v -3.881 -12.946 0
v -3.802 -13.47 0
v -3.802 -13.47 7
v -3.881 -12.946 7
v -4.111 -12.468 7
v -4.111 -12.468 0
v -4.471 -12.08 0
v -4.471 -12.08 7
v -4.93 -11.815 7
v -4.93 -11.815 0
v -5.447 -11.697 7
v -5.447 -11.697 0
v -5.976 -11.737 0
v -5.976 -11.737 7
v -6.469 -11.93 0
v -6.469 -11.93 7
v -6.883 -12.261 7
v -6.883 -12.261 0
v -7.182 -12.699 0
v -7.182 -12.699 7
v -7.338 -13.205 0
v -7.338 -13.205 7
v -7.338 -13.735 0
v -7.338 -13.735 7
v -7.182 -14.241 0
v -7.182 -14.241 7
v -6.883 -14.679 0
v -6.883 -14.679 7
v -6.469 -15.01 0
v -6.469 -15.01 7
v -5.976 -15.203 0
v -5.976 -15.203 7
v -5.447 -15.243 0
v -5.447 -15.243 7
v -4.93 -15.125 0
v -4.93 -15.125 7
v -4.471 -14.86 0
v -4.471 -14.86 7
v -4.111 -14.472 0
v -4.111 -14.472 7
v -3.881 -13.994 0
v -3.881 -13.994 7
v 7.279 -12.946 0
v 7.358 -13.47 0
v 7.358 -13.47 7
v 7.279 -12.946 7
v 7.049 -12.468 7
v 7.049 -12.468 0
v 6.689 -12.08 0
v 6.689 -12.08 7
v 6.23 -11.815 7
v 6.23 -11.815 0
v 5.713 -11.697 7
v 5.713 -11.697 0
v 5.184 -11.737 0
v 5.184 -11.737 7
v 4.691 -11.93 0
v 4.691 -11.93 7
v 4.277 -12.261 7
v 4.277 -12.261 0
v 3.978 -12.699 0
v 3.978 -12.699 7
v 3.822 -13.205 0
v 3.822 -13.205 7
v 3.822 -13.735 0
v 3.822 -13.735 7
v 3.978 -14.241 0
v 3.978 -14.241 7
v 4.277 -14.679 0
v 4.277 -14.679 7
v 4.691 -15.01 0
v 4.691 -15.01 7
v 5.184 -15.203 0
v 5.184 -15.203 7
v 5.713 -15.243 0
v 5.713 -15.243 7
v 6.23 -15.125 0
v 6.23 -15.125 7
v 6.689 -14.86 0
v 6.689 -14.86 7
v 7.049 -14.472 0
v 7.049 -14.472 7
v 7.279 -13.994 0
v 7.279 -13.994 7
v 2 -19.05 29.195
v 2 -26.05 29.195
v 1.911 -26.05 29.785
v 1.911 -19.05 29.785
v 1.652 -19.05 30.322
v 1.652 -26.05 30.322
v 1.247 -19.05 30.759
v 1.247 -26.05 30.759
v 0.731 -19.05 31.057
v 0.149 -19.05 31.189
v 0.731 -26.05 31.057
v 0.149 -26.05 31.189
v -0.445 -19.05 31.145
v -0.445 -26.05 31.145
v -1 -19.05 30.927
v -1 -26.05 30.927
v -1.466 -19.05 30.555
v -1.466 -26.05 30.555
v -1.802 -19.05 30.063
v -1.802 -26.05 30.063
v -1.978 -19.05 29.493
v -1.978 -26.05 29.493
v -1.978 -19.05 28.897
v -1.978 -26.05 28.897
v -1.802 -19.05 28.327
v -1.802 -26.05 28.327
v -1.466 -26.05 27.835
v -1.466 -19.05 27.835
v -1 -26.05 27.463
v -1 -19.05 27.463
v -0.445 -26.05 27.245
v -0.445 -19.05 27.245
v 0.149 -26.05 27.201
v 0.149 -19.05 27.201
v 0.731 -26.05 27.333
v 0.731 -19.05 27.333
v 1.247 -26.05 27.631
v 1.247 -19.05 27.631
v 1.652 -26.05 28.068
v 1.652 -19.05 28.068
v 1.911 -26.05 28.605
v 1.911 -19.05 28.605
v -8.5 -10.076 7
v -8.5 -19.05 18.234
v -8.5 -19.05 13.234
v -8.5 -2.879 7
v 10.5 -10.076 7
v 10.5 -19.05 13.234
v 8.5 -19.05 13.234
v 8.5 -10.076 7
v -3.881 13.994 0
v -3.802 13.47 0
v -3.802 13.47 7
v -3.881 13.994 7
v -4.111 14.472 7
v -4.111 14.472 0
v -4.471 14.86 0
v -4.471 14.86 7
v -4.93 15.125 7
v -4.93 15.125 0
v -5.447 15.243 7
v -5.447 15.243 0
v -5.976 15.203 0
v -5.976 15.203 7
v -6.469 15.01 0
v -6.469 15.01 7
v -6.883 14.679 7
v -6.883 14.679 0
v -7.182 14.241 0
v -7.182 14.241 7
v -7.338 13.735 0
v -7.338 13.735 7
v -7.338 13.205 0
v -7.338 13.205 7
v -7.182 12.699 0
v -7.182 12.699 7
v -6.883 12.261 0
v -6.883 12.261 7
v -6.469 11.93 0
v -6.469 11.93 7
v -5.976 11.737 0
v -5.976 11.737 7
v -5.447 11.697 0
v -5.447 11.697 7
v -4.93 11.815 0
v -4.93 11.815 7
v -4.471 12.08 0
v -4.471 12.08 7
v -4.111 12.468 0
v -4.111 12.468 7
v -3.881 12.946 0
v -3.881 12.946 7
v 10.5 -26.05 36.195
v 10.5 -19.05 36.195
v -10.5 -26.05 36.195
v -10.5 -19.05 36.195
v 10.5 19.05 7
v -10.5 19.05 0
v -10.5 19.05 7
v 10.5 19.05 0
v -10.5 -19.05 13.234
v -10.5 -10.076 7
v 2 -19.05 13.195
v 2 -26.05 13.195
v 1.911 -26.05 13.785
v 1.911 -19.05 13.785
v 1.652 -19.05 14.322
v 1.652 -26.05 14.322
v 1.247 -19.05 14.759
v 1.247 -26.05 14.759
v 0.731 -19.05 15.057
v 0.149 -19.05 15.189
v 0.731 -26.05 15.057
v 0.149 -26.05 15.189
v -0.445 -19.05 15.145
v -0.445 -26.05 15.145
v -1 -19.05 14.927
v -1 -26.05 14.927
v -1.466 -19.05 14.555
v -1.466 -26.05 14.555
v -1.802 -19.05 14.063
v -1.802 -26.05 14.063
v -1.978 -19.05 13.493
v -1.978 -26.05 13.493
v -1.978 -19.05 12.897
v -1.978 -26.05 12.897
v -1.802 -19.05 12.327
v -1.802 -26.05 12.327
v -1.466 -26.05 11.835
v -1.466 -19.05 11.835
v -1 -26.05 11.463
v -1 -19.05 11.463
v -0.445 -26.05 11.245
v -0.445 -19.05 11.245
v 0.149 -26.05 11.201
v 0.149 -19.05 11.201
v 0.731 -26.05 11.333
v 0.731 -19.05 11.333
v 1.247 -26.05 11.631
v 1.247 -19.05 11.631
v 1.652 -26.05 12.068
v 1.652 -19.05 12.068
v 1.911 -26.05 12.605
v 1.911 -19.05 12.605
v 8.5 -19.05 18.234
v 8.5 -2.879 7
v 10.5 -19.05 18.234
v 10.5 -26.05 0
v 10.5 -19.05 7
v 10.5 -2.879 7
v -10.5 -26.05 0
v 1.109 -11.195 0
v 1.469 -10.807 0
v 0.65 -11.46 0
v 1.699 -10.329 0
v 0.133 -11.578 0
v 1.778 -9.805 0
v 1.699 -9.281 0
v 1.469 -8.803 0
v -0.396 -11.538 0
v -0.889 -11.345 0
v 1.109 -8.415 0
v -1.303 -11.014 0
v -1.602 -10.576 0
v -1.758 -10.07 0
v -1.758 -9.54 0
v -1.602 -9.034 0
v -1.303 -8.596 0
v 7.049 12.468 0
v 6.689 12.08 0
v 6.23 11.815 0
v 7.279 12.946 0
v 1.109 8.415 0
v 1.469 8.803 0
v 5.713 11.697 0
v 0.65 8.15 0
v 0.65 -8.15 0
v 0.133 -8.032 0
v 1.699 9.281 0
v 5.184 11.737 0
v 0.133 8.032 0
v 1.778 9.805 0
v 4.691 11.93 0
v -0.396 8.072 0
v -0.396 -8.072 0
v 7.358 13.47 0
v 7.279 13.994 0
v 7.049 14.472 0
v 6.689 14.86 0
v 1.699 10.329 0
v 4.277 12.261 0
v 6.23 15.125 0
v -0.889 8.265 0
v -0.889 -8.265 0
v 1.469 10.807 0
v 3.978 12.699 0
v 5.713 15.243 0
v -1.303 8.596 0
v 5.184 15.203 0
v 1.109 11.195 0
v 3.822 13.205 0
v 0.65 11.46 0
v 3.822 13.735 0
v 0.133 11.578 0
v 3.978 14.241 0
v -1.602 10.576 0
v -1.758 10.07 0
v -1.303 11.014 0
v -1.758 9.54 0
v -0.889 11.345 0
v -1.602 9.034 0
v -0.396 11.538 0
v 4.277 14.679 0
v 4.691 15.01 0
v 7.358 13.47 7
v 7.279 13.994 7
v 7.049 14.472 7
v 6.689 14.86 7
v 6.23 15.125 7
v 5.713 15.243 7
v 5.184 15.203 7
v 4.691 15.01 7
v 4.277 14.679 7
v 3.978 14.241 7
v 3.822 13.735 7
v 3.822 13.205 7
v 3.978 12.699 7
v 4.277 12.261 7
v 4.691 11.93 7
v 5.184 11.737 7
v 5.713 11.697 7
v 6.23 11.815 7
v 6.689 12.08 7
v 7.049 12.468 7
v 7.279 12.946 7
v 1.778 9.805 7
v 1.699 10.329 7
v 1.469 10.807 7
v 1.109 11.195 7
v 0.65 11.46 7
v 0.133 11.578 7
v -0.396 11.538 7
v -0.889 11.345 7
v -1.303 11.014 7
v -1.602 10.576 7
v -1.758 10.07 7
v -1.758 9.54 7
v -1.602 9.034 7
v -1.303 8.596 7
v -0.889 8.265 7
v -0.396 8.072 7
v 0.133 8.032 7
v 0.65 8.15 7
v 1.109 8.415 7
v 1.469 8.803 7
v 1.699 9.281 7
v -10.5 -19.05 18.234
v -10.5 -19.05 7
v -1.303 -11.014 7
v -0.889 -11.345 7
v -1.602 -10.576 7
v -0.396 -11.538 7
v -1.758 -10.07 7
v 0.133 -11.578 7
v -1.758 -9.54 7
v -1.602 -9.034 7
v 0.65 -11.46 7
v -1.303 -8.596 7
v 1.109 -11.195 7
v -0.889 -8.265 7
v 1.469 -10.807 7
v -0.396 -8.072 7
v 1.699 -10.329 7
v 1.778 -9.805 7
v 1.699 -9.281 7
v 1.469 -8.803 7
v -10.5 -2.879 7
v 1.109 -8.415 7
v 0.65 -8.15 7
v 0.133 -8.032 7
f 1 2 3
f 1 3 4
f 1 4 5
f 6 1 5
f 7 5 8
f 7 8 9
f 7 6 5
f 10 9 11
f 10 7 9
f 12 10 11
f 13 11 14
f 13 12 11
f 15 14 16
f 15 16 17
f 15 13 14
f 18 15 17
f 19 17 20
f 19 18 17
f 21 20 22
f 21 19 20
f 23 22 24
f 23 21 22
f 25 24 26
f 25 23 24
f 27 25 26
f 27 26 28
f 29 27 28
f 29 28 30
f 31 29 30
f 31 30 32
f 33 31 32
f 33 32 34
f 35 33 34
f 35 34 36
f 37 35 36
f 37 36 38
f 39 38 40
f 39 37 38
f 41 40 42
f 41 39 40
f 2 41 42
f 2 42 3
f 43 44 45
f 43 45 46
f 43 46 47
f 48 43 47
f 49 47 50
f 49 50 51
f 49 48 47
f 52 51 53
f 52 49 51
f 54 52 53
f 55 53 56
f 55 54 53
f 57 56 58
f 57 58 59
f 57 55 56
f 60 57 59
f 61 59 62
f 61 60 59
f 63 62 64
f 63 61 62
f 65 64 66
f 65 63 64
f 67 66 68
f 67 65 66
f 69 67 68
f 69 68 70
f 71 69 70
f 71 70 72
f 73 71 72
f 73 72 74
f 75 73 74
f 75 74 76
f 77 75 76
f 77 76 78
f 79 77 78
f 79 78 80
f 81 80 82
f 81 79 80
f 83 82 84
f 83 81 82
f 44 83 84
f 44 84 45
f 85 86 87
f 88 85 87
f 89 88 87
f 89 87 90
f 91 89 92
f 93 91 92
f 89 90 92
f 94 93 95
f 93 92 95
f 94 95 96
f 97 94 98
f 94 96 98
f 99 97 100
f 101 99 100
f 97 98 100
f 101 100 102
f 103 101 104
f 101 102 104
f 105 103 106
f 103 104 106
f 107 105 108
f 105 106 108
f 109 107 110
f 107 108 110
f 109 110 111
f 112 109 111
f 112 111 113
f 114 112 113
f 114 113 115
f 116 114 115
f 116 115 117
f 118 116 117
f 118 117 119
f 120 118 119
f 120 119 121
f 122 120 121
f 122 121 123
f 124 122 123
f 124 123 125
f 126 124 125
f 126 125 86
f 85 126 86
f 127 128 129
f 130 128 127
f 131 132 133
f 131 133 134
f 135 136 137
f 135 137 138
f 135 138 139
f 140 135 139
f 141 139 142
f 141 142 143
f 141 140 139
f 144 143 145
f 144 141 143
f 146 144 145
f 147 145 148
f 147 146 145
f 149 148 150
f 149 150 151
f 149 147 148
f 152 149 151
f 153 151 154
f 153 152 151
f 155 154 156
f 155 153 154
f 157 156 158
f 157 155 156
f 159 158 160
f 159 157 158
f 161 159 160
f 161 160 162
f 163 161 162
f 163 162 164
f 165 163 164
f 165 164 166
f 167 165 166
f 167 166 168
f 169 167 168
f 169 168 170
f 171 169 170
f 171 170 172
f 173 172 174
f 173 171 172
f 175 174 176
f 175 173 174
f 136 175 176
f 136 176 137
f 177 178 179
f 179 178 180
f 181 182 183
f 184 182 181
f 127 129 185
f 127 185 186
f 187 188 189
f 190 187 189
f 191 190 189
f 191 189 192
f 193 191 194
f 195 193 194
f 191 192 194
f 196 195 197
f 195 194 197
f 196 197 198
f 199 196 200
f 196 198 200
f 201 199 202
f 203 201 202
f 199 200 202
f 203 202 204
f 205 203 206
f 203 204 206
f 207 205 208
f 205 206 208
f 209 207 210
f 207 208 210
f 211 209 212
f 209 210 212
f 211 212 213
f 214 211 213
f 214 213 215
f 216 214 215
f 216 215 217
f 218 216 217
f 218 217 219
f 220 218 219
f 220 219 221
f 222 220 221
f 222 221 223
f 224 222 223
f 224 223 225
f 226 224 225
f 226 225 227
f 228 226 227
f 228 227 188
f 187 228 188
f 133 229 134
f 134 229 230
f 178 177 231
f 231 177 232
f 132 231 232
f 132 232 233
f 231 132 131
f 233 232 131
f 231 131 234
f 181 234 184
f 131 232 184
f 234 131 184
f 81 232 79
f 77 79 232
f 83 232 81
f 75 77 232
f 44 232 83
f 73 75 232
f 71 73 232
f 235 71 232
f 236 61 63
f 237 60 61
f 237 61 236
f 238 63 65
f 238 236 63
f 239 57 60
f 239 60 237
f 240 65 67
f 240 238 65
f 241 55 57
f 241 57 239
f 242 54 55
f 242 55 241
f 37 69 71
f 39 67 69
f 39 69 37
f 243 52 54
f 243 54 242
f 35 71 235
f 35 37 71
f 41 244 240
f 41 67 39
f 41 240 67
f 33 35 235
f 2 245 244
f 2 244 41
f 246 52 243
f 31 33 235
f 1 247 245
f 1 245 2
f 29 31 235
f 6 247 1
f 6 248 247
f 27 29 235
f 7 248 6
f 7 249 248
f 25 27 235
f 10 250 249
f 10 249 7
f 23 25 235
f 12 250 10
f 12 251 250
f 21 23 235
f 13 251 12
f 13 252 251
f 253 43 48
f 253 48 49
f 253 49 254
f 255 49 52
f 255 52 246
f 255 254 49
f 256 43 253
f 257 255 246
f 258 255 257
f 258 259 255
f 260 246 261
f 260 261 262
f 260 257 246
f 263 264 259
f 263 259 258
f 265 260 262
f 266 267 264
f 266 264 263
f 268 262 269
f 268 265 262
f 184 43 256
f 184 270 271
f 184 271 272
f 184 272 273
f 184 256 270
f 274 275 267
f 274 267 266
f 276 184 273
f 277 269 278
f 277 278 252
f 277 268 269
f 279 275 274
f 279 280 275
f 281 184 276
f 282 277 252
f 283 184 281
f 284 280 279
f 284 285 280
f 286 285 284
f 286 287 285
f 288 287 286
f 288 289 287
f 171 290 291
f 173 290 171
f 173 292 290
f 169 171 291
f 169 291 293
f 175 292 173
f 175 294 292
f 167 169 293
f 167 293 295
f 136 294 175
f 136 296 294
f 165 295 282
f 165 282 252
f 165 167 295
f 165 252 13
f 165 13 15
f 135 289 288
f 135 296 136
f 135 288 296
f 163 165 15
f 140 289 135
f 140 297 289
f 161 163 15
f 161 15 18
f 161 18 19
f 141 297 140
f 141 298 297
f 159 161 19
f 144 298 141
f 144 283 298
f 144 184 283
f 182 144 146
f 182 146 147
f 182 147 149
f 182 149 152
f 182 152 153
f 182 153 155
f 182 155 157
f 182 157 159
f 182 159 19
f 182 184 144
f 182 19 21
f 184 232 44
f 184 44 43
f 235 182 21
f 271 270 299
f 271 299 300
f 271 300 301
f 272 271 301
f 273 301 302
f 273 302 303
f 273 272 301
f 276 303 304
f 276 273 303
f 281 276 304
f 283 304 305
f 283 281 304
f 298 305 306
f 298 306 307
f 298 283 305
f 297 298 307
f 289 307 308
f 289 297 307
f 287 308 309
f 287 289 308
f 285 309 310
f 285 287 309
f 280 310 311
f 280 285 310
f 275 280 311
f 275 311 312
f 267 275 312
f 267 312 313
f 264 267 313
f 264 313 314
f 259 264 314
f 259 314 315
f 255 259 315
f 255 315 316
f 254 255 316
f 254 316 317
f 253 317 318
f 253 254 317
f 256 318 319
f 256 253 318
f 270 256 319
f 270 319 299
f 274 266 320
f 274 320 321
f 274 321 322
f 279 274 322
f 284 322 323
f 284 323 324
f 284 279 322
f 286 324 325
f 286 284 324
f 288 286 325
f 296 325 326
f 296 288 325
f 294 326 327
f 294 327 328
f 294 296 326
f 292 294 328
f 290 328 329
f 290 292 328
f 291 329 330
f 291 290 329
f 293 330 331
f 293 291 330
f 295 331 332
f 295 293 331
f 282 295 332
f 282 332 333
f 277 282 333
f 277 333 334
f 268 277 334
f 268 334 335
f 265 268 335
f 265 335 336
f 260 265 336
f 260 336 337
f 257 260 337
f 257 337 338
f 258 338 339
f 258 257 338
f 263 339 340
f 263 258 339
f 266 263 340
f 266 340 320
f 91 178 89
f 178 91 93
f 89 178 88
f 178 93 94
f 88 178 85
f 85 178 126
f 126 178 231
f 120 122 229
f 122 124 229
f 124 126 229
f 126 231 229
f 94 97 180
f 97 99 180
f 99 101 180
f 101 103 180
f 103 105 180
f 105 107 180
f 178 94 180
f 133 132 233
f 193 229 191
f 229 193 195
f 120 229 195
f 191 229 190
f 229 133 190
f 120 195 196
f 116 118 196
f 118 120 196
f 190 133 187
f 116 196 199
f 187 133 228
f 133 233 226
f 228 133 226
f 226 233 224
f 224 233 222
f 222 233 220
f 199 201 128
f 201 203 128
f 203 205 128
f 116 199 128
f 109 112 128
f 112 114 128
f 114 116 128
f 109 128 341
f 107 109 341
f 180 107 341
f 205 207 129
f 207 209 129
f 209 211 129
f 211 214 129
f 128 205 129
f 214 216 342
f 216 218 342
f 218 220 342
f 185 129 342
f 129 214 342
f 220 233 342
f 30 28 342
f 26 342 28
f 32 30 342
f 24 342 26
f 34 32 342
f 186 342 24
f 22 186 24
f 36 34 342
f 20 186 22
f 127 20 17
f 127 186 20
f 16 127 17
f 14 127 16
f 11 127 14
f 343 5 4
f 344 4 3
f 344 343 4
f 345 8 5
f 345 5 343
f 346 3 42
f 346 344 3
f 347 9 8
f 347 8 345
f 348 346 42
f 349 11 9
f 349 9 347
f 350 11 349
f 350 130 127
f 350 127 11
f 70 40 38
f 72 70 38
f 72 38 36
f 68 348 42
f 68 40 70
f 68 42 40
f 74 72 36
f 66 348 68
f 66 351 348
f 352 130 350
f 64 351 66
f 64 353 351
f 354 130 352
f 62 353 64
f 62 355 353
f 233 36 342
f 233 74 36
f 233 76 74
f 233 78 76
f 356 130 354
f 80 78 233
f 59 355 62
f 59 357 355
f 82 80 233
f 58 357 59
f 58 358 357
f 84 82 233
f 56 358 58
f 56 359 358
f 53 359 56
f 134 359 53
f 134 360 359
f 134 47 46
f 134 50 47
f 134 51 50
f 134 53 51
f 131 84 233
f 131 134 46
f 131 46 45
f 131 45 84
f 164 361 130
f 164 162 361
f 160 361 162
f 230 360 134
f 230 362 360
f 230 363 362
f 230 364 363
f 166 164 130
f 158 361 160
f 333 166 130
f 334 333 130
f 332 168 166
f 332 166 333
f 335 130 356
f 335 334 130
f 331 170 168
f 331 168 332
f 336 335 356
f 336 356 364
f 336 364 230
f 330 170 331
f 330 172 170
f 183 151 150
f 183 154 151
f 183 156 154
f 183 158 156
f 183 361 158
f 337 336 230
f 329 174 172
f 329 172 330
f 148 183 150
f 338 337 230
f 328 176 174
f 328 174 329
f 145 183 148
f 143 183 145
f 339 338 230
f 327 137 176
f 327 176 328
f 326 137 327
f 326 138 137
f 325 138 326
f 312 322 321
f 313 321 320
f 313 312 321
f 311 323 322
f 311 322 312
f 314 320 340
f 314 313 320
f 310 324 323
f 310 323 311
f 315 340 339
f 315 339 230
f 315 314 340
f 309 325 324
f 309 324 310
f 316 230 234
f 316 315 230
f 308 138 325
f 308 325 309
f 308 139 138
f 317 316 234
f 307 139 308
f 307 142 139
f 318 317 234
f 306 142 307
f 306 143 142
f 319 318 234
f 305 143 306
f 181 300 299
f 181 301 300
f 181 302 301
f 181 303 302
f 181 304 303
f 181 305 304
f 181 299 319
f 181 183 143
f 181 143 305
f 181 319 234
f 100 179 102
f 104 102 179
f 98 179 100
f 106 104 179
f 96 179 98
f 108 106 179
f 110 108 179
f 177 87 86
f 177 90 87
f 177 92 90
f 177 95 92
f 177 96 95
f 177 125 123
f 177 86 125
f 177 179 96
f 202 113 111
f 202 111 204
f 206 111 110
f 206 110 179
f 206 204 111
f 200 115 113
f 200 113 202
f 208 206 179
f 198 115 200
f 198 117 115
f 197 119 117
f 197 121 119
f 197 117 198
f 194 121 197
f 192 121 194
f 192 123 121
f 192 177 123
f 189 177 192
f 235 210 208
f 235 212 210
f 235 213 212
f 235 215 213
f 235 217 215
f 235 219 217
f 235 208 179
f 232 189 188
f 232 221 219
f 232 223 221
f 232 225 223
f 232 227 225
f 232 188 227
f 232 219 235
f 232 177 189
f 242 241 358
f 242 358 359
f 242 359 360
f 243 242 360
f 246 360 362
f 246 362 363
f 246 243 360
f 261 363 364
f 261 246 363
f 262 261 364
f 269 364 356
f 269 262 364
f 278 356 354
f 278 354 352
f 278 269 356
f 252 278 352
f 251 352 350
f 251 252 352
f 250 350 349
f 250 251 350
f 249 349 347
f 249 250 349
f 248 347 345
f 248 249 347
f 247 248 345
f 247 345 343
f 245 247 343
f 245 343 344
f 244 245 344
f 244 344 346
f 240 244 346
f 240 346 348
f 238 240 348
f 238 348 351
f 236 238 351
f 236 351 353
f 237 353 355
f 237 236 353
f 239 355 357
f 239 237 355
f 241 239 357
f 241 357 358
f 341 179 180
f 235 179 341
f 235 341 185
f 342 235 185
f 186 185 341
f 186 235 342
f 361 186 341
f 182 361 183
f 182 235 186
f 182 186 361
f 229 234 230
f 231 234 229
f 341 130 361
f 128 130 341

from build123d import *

# Parameters (mm, degrees)
SKETCH1_W           = 21
SKETCH1_H           = 38.1
SKETCH1_R           = 1.778
BOSS_EXTRUDE1_DEPTH = 7
SKETCH3_W           = 21
SKETCH3_H           = 7
BOSS_EXTRUDE2_DEPTH = 36.195
SKETCH4_R           = 2
CUT_EXTRUDE1_DEPTH  = 10.5
BOSS_EXTRUDE3_DEPTH = 2
BOSS_EXTRUDE4_START = -19
BOSS_EXTRUDE4_DEPTH = 2


with BuildPart() as part:
    # Sketch1 → Boss-Extrude1 (new body)
    with BuildSketch(Plane.XY):
        Rectangle(SKETCH1_W, SKETCH1_H)
        with Locations((-5.58, 13.47)):
            Circle(SKETCH1_R, mode=Mode.SUBTRACT)
        with Locations((5.58, 13.47)):
            Circle(SKETCH1_R, mode=Mode.SUBTRACT)
        with Locations((0, 9.805)):
            Circle(SKETCH1_R, mode=Mode.SUBTRACT)
        with Locations((5.58, -13.47)):
            Circle(SKETCH1_R, mode=Mode.SUBTRACT)
        with Locations((0, -9.805)):
            Circle(SKETCH1_R, mode=Mode.SUBTRACT)
        with Locations((-5.58, -13.47)):
            Circle(SKETCH1_R, mode=Mode.SUBTRACT)
    extrude(amount=BOSS_EXTRUDE1_DEPTH)

    # Sketch3 → Boss-Extrude2 (add)
    with BuildSketch(Plane(origin=(0, 0, 0), x_dir=(-1, 0, 0), z_dir=(0, 0, -1))):
        with Locations((0, -22.55)):
            Rectangle(SKETCH3_W, SKETCH3_H)
    extrude(amount=-BOSS_EXTRUDE2_DEPTH)

    # Sketch4 → Cut-Extrude1 (cut)
    with BuildSketch(Plane.XZ.offset(26.05)):
        with Locations((0, 13.195)):
            Circle(SKETCH4_R)
        with Locations((0, 29.195)):
            Circle(SKETCH4_R)
    extrude(amount=-CUT_EXTRUDE1_DEPTH, mode=Mode.SUBTRACT)

    # Sketch5 → Boss-Extrude3 (add)
    with BuildSketch(Plane(origin=(10.5, 0, 0), x_dir=(0, 0, -1), z_dir=(1, 0, 0))):
        Polygon((-18.0975, -26.05), (0, 0), (0, 7.197126675), (-23.0975, -26.05), align=None)
    extrude(amount=-BOSS_EXTRUDE3_DEPTH)

    # Sketch5<2> → Boss-Extrude4 (add)
    with BuildSketch(Plane(origin=(10.5, 0, 0), x_dir=(0, 0, -1), z_dir=(1, 0, 0)).offset(BOSS_EXTRUDE4_START)):
        Polygon((-18.0975, -26.05), (0, 0), (0, 7.197126675), (-23.0975, -26.05), align=None)
    extrude(amount=-BOSS_EXTRUDE4_DEPTH)


solid = part.part
